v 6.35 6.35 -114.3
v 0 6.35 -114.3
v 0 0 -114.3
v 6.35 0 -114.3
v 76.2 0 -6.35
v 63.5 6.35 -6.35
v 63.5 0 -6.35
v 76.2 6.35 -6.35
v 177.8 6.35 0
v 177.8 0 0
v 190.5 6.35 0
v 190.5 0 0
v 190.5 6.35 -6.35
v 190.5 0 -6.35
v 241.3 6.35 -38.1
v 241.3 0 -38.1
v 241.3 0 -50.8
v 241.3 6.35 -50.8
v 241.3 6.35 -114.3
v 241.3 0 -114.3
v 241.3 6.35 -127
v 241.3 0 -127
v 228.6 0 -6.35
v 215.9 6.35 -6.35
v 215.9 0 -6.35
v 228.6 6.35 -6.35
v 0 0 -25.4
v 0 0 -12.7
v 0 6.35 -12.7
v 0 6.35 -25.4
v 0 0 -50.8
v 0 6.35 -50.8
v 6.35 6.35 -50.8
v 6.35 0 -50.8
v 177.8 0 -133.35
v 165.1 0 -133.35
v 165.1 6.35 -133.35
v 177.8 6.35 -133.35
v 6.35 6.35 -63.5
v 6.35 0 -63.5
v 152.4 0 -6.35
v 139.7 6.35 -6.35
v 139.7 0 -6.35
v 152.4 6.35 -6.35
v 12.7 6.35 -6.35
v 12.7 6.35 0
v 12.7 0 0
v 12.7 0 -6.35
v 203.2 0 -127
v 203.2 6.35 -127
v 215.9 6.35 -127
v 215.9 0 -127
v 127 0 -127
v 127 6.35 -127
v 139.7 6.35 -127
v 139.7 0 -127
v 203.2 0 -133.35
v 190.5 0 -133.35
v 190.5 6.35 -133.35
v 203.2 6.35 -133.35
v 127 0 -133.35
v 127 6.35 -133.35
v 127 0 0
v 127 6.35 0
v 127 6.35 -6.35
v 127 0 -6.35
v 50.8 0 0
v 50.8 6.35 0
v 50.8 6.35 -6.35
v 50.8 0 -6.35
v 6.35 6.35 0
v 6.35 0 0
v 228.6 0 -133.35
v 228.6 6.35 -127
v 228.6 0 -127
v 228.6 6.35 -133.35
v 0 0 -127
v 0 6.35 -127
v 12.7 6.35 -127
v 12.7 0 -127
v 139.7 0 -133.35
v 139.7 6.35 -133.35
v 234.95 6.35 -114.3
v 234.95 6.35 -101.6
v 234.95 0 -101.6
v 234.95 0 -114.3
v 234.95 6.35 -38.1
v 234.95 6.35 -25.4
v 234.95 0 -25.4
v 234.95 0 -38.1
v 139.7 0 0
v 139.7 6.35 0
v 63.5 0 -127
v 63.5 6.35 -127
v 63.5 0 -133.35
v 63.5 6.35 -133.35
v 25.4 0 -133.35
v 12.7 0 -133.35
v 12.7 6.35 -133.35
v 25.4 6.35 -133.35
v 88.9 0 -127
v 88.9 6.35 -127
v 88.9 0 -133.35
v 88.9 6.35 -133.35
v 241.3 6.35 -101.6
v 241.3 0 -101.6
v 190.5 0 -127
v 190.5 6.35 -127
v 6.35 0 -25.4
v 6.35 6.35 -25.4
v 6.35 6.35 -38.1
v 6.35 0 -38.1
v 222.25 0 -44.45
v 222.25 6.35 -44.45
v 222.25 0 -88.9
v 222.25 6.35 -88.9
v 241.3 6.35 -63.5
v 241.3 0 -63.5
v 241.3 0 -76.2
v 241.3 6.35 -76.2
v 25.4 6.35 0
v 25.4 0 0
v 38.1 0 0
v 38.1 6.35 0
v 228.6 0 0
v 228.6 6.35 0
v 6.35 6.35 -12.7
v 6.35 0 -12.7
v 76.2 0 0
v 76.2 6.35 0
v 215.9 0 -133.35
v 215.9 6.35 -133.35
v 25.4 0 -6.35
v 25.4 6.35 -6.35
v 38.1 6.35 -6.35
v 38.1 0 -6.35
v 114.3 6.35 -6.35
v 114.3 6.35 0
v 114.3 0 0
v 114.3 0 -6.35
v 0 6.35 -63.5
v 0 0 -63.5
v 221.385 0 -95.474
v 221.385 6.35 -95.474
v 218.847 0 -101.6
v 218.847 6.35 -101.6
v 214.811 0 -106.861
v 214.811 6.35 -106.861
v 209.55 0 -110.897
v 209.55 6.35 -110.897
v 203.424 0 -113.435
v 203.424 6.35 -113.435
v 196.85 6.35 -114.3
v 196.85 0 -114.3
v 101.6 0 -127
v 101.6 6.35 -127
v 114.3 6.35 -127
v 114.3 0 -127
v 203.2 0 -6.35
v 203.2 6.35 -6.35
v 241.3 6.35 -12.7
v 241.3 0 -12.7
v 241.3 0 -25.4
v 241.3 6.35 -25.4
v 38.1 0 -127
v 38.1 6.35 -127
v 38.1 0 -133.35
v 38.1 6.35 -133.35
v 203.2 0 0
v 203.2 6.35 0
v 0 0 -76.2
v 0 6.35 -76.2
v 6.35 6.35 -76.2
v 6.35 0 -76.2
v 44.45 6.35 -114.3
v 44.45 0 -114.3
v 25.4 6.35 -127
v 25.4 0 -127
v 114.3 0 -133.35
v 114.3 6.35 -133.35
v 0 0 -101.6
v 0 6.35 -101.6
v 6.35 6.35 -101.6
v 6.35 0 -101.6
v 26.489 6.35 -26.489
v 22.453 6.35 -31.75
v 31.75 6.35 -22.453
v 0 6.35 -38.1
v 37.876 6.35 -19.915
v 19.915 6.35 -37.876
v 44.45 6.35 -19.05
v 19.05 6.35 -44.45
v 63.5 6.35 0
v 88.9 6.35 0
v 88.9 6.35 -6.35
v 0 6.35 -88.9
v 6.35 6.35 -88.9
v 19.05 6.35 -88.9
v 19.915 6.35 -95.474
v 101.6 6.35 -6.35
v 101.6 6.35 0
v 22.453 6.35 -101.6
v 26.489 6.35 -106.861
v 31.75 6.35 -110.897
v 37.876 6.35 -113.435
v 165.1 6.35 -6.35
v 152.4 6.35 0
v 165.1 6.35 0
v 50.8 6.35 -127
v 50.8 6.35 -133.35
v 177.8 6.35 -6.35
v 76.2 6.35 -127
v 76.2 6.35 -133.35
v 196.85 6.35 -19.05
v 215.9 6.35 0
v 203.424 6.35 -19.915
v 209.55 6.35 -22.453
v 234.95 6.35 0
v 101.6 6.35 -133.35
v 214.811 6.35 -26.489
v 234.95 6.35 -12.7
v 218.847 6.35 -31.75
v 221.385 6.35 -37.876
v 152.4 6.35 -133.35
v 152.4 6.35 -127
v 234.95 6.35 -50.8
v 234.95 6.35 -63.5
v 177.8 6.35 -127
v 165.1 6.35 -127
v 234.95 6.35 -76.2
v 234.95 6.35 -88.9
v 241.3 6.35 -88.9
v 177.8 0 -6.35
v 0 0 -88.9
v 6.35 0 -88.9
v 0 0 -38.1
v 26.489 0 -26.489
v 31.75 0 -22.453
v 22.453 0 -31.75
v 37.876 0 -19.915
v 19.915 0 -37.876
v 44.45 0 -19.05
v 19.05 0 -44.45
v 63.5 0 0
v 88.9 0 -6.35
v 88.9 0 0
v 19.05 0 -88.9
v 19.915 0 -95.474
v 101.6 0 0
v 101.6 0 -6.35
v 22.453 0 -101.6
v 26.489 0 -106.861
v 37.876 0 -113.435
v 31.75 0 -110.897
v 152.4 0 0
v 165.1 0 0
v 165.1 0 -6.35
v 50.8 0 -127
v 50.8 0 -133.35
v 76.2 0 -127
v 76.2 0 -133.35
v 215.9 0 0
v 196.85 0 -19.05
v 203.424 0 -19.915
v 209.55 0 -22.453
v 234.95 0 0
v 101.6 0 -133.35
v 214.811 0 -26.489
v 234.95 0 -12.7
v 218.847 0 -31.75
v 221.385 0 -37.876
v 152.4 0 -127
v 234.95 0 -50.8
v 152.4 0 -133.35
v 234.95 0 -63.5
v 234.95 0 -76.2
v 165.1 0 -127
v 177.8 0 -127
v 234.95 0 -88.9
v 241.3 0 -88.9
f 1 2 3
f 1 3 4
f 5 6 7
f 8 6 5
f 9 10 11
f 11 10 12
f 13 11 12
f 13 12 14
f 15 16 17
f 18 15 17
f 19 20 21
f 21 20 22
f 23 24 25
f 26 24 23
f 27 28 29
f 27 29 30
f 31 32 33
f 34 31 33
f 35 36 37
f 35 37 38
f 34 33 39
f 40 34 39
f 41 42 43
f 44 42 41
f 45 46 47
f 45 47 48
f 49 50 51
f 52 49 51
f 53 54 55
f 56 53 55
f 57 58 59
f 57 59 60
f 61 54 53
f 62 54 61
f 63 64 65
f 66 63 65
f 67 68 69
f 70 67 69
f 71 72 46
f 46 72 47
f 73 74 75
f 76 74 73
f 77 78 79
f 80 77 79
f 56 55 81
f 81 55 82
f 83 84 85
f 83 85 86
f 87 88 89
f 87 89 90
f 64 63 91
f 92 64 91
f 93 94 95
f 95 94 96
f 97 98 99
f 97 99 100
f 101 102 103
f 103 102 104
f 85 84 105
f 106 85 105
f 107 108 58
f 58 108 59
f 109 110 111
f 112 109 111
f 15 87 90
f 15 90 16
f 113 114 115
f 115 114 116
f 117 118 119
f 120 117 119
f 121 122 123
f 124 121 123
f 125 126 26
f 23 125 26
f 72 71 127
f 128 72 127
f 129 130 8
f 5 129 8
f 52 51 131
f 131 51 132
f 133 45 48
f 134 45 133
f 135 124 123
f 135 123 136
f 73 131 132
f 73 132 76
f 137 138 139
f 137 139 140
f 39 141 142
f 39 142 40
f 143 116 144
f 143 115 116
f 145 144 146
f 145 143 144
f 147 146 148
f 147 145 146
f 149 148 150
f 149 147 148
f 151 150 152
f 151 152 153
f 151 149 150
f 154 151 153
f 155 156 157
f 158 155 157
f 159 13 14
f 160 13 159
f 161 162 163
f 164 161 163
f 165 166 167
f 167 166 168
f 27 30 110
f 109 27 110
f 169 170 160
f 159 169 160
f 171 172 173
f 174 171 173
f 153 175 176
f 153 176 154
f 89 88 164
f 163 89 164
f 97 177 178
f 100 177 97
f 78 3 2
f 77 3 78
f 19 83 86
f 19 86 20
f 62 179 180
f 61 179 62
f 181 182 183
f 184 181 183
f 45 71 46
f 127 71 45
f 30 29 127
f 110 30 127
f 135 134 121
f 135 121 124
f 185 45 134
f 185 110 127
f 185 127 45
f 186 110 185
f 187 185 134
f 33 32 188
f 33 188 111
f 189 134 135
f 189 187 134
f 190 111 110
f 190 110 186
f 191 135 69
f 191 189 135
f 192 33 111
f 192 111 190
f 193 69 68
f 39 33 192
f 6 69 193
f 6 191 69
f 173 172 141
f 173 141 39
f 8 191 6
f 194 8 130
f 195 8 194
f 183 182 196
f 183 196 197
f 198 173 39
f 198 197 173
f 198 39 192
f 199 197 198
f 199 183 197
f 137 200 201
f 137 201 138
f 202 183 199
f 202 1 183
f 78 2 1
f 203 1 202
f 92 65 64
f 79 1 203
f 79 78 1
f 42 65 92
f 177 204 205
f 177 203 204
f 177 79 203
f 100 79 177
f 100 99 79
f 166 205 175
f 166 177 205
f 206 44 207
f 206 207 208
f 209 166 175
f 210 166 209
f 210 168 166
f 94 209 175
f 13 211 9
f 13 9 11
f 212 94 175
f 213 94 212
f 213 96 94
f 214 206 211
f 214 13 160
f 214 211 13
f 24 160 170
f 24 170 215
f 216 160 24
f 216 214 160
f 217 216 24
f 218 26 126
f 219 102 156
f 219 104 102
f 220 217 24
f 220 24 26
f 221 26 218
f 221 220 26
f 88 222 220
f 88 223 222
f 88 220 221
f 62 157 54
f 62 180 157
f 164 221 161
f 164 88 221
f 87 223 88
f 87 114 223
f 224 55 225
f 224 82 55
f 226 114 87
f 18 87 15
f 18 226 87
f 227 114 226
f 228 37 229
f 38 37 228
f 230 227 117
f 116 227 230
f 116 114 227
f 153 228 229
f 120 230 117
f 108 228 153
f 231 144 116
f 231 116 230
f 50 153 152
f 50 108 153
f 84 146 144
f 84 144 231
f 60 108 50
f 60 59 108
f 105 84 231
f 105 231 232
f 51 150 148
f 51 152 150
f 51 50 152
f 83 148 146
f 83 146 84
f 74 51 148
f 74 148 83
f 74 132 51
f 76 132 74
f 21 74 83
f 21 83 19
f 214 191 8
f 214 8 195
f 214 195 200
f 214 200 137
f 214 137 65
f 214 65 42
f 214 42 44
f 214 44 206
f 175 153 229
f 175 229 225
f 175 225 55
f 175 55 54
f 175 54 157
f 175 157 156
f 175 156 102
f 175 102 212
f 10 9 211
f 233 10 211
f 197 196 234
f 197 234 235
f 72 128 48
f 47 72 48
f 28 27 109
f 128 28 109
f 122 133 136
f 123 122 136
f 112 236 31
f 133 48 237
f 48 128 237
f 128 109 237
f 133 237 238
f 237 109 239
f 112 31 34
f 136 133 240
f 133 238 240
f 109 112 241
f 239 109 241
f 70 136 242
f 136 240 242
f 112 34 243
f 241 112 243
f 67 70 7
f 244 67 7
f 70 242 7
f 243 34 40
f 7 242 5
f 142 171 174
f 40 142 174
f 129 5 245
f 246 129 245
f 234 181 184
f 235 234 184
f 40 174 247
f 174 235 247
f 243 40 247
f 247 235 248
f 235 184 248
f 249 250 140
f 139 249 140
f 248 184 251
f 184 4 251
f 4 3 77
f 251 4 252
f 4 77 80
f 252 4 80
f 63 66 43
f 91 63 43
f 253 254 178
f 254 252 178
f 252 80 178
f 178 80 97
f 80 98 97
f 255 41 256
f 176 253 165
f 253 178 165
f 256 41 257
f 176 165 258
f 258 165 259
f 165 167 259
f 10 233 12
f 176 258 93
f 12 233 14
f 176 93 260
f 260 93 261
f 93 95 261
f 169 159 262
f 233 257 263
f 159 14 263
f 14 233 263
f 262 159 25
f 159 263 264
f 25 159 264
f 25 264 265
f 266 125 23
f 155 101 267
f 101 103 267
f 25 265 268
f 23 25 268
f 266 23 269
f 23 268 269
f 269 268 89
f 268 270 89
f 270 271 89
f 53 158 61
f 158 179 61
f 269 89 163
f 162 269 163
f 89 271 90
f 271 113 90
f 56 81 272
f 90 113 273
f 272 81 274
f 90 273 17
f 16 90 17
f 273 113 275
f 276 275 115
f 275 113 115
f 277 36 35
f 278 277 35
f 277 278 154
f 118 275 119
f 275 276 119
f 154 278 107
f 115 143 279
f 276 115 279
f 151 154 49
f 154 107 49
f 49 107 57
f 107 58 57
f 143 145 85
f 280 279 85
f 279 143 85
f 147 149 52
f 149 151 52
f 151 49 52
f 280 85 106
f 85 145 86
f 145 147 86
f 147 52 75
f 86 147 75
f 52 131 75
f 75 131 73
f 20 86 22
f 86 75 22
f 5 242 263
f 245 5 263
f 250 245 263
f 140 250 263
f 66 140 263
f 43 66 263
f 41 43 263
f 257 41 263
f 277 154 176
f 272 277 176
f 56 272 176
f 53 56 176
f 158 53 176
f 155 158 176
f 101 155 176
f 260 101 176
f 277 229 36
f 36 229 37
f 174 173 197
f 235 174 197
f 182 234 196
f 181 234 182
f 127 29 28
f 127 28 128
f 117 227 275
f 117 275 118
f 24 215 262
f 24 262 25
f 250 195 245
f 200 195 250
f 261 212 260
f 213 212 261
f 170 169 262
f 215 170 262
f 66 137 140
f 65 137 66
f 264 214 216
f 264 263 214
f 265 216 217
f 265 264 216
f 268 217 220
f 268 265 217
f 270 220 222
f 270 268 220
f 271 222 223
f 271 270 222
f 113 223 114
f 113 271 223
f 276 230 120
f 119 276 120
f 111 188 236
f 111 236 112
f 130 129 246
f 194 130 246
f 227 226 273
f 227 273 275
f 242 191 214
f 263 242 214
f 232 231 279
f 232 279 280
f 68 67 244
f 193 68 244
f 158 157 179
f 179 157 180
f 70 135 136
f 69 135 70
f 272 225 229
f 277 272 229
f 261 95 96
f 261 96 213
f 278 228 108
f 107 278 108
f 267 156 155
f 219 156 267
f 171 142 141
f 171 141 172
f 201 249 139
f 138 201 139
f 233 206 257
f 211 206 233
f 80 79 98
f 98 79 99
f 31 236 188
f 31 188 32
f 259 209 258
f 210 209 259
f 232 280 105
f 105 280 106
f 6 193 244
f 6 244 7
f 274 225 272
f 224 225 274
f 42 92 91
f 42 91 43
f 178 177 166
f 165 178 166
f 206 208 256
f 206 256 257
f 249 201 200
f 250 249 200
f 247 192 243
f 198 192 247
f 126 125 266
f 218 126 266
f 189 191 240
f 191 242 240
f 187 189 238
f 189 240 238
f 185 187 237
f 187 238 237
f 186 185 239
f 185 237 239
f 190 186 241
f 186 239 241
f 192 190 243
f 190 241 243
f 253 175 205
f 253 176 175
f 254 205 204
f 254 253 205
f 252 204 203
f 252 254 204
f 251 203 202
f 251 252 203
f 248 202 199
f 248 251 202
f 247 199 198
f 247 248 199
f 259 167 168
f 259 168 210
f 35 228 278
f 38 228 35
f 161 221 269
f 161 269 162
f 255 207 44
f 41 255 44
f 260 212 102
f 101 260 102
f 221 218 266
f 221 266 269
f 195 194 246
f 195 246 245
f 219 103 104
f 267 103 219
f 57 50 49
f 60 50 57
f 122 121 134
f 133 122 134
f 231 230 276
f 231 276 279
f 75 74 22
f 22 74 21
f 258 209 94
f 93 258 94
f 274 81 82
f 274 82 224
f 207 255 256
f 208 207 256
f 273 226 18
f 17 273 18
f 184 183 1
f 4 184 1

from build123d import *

# Parameters (mm, degrees)
SKETCH2_W           = 241.3
SKETCH2_H           = 133.35
BOSS_EXTRUDE1_DEPTH = 6.35
SKETCH3_W           = 6.35
SKETCH3_H           = 12.7
CUT_EXTRUDE1_DEPTH  = 7.35
LPATTERN1_COUNT     = 6
LPATTERN1_PITCH     = 25.4
SKETCH4_W           = 12.7
SKETCH4_H           = 6.35
CUT_EXTRUDE2_DEPTH  = 7.35
LPATTERN2_COUNT     = 10
LPATTERN2_PITCH     = 25.4
SKETCH5_W           = 12.7
SKETCH5_H           = 6.35
CUT_EXTRUDE3_DEPTH  = 7.35
LPATTERN3_COUNT     = 10
LPATTERN3_PITCH     = 25.4
SKETCH6_W           = 203.2
SKETCH6_H           = 95.25
CUT_EXTRUDE4_DEPTH  = 7.35
FILLET1_R           = 25.4


with BuildPart() as part:
    # Sketch2 → Boss-Extrude1 (new body)
    with BuildSketch(Plane(origin=(0, 0, 0), x_dir=(1, 0, 0), z_dir=(0, 1, 0))):
        with Locations((120.65, 66.675)):
            Rectangle(SKETCH2_W, SKETCH2_H)
    extrude(amount=BOSS_EXTRUDE1_DEPTH)

    # Sketch3 → Cut-Extrude1 (cut, through all)
    with BuildSketch(Plane(origin=(0, 6.35, 0), x_dir=(1, 0, 0), z_dir=(0, 1, 0))):
        with Locations((3.175, 6.35)):
            Rectangle(SKETCH3_W, SKETCH3_H)
        with Locations((238.125, 6.35)):
            Rectangle(SKETCH3_W, SKETCH3_H)
    cut_extrude1 = extrude(amount=-CUT_EXTRUDE1_DEPTH, mode=Mode.SUBTRACT)

    # LPattern1: Cut-Extrude1 ×6
    with Locations(*[(0, 0, -i * LPATTERN1_PITCH) for i in range(1, LPATTERN1_COUNT)]):
        add(cut_extrude1, mode=Mode.SUBTRACT)

    # Sketch4 → Cut-Extrude2 (cut, through all)
    with BuildSketch(Plane(origin=(0, 6.35, 0), x_dir=(1, 0, 0), z_dir=(0, 1, 0))):
        with Locations((222.25, 3.175)):
            Rectangle(SKETCH4_W, SKETCH4_H)
    cut_extrude2 = extrude(amount=-CUT_EXTRUDE2_DEPTH, mode=Mode.SUBTRACT)

    # LPattern2: Cut-Extrude2 ×10
    with Locations(*[(-i * LPATTERN2_PITCH, 0, 0) for i in range(1, LPATTERN2_COUNT)]):
        add(cut_extrude2, mode=Mode.SUBTRACT)

    # Sketch5 → Cut-Extrude3 (cut, through all)
    with BuildSketch(Plane(origin=(0, 6.35, 0), x_dir=(1, 0, 0), z_dir=(0, 1, 0))):
        with Locations((6.35, 130.175)):
            Rectangle(SKETCH5_W, SKETCH5_H)
    cut_extrude3 = extrude(amount=-CUT_EXTRUDE3_DEPTH, mode=Mode.SUBTRACT)

    # LPattern3: Cut-Extrude3 ×10
    with Locations(*[(i * LPATTERN3_PITCH, 0, 0) for i in range(1, LPATTERN3_COUNT)]):
        add(cut_extrude3, mode=Mode.SUBTRACT)

    # Sketch6 → Cut-Extrude4 (cut, through all)
    with BuildSketch(Plane(origin=(0, 6.35, 0), x_dir=(1, 0, 0), z_dir=(0, 1, 0))):
        with Locations((120.65, 66.675)):
            Rectangle(SKETCH6_W, SKETCH6_H)
    extrude(amount=-CUT_EXTRUDE4_DEPTH, mode=Mode.SUBTRACT)

    # Fillet1
    fillet1_edges = [part.edges().sort_by_distance(p)[0] for p in [
        (19.05, 3.175, -19.05),
        (19.05, 3.175, -114.3),
        (222.25, 3.175, -114.3),
        (222.25, 3.175, -19.05),
    ]]
    fillet(fillet1_edges, radius=FILLET1_R)


solid = part.part
